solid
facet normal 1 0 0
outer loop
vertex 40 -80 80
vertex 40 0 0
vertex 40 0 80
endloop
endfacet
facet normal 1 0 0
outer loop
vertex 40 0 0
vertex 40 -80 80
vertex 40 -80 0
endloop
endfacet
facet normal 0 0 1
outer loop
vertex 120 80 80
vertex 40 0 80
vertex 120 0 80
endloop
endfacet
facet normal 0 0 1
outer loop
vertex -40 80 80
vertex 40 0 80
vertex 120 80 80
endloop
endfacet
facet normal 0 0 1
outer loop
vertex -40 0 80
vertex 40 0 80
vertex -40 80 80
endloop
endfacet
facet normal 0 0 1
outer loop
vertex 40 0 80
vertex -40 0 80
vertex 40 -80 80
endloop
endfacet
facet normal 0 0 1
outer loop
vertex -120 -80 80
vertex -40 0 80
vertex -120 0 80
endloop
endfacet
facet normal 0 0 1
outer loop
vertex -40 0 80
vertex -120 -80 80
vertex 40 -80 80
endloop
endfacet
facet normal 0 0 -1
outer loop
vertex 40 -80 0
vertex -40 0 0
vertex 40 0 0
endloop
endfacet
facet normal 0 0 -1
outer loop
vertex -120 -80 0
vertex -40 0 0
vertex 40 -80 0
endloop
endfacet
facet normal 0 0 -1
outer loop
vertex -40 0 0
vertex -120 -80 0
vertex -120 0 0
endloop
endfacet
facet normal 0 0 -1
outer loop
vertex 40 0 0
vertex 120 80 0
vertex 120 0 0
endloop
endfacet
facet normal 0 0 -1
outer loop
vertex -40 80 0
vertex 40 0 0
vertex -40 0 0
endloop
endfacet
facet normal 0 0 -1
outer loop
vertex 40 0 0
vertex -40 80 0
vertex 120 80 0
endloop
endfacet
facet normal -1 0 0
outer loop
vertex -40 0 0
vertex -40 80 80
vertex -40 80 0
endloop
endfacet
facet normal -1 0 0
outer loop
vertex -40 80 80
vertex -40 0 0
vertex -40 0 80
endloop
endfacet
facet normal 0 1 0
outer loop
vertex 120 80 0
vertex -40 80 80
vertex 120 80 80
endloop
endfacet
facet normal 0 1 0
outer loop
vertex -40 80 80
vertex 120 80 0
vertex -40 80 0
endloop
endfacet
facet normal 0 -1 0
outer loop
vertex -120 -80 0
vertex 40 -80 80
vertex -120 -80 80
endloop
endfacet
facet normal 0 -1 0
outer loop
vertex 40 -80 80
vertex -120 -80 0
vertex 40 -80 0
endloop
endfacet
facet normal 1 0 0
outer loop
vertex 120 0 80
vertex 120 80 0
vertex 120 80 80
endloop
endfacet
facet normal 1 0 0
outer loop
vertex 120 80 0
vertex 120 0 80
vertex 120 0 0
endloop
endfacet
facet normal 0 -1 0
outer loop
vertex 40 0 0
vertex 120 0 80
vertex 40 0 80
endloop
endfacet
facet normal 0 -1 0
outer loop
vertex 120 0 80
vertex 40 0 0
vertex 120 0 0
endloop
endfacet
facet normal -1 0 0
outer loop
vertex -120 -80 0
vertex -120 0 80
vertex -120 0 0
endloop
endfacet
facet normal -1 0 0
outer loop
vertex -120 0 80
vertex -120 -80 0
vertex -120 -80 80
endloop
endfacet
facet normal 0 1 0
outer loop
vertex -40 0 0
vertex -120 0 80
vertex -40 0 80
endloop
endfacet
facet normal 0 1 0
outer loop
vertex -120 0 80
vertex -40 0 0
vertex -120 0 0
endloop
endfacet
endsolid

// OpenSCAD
// type of tetris piece
_1_piece = "Z"; //[I,Z,L,T,O]

// size of a tetris block (parts will be larger)
_2_size = 80;

// depth of the tetris piece
_3_depth = 80;

/* [Hidden] */

// thickness of the walls
_4_thickness = 2;

_5_solid = true;

module createPart(type, size, depth, thickness, solid) {
	eps = 0.1;

	translate([0,0,depth/2]) {
		if (type == "I") {
			difference() {
				cube(size=[size*4, size, depth], center=true);
                if (!solid) {
                    cube(size=[size*4-thickness*2, size-thickness*2, depth+eps], center=true);
                }
			}
		} else if (type == "O") {
			difference() {
				cube(size=[size*2, size*2, depth], center=true);
                if (!solid) {
                    cube(size=[size*2-thickness*2, size*2-thickness*2, depth+eps], center=true);
                }
			}
		} else if (type == "T" || type == "L") {
			translate([0, -size/2,0])
			difference() {
				union() {
					cube(size=[size*3, size, depth], center=true);
					translate([type == "L" ? size : 0, size/2,0]) {
						cube(size=[size, size*2, depth], center=true);
					}
				}
                if (!solid) {
                    cube(size=[size*3-thickness*2, size-thickness*2, depth+eps], center=true);
                    translate([type == "L" ? size : 0, size/2,0]) {
                        cube(size=[size-thickness*2, size*2-thickness*2, depth+eps], center=true);
                    }
                }
			}
		} else if (type == "Z") {
			difference() {
				union() {
					cube(size=[size, size*2, depth], center=true);
					translate([size/2, size/2,0]) {
						cube(size=[size*2, size, depth], center=true);
					}
					translate([-size/2, -size/2,0]) {
						cube(size=[size*2, size, depth], center=true);
					}
				}
                if (!solid) {
                    cube(size=[size - thickness*2, size*2 - thickness*2, depth+eps], center=true);
                    translate([size/2, size/2,0]) {
                        cube(size=[size*2 - thickness*2, size - thickness*2, depth+eps], center=true);
                    }
                    translate([-size/2, -size/2,0]) {
                        cube(size=[size*2 - thickness*2, size - thickness*2, depth+eps], center=true);
                    }
                }
			}
		}
	}
}

createPart(_1_piece, _2_size, _3_depth, _4_thickness, _5_solid);
